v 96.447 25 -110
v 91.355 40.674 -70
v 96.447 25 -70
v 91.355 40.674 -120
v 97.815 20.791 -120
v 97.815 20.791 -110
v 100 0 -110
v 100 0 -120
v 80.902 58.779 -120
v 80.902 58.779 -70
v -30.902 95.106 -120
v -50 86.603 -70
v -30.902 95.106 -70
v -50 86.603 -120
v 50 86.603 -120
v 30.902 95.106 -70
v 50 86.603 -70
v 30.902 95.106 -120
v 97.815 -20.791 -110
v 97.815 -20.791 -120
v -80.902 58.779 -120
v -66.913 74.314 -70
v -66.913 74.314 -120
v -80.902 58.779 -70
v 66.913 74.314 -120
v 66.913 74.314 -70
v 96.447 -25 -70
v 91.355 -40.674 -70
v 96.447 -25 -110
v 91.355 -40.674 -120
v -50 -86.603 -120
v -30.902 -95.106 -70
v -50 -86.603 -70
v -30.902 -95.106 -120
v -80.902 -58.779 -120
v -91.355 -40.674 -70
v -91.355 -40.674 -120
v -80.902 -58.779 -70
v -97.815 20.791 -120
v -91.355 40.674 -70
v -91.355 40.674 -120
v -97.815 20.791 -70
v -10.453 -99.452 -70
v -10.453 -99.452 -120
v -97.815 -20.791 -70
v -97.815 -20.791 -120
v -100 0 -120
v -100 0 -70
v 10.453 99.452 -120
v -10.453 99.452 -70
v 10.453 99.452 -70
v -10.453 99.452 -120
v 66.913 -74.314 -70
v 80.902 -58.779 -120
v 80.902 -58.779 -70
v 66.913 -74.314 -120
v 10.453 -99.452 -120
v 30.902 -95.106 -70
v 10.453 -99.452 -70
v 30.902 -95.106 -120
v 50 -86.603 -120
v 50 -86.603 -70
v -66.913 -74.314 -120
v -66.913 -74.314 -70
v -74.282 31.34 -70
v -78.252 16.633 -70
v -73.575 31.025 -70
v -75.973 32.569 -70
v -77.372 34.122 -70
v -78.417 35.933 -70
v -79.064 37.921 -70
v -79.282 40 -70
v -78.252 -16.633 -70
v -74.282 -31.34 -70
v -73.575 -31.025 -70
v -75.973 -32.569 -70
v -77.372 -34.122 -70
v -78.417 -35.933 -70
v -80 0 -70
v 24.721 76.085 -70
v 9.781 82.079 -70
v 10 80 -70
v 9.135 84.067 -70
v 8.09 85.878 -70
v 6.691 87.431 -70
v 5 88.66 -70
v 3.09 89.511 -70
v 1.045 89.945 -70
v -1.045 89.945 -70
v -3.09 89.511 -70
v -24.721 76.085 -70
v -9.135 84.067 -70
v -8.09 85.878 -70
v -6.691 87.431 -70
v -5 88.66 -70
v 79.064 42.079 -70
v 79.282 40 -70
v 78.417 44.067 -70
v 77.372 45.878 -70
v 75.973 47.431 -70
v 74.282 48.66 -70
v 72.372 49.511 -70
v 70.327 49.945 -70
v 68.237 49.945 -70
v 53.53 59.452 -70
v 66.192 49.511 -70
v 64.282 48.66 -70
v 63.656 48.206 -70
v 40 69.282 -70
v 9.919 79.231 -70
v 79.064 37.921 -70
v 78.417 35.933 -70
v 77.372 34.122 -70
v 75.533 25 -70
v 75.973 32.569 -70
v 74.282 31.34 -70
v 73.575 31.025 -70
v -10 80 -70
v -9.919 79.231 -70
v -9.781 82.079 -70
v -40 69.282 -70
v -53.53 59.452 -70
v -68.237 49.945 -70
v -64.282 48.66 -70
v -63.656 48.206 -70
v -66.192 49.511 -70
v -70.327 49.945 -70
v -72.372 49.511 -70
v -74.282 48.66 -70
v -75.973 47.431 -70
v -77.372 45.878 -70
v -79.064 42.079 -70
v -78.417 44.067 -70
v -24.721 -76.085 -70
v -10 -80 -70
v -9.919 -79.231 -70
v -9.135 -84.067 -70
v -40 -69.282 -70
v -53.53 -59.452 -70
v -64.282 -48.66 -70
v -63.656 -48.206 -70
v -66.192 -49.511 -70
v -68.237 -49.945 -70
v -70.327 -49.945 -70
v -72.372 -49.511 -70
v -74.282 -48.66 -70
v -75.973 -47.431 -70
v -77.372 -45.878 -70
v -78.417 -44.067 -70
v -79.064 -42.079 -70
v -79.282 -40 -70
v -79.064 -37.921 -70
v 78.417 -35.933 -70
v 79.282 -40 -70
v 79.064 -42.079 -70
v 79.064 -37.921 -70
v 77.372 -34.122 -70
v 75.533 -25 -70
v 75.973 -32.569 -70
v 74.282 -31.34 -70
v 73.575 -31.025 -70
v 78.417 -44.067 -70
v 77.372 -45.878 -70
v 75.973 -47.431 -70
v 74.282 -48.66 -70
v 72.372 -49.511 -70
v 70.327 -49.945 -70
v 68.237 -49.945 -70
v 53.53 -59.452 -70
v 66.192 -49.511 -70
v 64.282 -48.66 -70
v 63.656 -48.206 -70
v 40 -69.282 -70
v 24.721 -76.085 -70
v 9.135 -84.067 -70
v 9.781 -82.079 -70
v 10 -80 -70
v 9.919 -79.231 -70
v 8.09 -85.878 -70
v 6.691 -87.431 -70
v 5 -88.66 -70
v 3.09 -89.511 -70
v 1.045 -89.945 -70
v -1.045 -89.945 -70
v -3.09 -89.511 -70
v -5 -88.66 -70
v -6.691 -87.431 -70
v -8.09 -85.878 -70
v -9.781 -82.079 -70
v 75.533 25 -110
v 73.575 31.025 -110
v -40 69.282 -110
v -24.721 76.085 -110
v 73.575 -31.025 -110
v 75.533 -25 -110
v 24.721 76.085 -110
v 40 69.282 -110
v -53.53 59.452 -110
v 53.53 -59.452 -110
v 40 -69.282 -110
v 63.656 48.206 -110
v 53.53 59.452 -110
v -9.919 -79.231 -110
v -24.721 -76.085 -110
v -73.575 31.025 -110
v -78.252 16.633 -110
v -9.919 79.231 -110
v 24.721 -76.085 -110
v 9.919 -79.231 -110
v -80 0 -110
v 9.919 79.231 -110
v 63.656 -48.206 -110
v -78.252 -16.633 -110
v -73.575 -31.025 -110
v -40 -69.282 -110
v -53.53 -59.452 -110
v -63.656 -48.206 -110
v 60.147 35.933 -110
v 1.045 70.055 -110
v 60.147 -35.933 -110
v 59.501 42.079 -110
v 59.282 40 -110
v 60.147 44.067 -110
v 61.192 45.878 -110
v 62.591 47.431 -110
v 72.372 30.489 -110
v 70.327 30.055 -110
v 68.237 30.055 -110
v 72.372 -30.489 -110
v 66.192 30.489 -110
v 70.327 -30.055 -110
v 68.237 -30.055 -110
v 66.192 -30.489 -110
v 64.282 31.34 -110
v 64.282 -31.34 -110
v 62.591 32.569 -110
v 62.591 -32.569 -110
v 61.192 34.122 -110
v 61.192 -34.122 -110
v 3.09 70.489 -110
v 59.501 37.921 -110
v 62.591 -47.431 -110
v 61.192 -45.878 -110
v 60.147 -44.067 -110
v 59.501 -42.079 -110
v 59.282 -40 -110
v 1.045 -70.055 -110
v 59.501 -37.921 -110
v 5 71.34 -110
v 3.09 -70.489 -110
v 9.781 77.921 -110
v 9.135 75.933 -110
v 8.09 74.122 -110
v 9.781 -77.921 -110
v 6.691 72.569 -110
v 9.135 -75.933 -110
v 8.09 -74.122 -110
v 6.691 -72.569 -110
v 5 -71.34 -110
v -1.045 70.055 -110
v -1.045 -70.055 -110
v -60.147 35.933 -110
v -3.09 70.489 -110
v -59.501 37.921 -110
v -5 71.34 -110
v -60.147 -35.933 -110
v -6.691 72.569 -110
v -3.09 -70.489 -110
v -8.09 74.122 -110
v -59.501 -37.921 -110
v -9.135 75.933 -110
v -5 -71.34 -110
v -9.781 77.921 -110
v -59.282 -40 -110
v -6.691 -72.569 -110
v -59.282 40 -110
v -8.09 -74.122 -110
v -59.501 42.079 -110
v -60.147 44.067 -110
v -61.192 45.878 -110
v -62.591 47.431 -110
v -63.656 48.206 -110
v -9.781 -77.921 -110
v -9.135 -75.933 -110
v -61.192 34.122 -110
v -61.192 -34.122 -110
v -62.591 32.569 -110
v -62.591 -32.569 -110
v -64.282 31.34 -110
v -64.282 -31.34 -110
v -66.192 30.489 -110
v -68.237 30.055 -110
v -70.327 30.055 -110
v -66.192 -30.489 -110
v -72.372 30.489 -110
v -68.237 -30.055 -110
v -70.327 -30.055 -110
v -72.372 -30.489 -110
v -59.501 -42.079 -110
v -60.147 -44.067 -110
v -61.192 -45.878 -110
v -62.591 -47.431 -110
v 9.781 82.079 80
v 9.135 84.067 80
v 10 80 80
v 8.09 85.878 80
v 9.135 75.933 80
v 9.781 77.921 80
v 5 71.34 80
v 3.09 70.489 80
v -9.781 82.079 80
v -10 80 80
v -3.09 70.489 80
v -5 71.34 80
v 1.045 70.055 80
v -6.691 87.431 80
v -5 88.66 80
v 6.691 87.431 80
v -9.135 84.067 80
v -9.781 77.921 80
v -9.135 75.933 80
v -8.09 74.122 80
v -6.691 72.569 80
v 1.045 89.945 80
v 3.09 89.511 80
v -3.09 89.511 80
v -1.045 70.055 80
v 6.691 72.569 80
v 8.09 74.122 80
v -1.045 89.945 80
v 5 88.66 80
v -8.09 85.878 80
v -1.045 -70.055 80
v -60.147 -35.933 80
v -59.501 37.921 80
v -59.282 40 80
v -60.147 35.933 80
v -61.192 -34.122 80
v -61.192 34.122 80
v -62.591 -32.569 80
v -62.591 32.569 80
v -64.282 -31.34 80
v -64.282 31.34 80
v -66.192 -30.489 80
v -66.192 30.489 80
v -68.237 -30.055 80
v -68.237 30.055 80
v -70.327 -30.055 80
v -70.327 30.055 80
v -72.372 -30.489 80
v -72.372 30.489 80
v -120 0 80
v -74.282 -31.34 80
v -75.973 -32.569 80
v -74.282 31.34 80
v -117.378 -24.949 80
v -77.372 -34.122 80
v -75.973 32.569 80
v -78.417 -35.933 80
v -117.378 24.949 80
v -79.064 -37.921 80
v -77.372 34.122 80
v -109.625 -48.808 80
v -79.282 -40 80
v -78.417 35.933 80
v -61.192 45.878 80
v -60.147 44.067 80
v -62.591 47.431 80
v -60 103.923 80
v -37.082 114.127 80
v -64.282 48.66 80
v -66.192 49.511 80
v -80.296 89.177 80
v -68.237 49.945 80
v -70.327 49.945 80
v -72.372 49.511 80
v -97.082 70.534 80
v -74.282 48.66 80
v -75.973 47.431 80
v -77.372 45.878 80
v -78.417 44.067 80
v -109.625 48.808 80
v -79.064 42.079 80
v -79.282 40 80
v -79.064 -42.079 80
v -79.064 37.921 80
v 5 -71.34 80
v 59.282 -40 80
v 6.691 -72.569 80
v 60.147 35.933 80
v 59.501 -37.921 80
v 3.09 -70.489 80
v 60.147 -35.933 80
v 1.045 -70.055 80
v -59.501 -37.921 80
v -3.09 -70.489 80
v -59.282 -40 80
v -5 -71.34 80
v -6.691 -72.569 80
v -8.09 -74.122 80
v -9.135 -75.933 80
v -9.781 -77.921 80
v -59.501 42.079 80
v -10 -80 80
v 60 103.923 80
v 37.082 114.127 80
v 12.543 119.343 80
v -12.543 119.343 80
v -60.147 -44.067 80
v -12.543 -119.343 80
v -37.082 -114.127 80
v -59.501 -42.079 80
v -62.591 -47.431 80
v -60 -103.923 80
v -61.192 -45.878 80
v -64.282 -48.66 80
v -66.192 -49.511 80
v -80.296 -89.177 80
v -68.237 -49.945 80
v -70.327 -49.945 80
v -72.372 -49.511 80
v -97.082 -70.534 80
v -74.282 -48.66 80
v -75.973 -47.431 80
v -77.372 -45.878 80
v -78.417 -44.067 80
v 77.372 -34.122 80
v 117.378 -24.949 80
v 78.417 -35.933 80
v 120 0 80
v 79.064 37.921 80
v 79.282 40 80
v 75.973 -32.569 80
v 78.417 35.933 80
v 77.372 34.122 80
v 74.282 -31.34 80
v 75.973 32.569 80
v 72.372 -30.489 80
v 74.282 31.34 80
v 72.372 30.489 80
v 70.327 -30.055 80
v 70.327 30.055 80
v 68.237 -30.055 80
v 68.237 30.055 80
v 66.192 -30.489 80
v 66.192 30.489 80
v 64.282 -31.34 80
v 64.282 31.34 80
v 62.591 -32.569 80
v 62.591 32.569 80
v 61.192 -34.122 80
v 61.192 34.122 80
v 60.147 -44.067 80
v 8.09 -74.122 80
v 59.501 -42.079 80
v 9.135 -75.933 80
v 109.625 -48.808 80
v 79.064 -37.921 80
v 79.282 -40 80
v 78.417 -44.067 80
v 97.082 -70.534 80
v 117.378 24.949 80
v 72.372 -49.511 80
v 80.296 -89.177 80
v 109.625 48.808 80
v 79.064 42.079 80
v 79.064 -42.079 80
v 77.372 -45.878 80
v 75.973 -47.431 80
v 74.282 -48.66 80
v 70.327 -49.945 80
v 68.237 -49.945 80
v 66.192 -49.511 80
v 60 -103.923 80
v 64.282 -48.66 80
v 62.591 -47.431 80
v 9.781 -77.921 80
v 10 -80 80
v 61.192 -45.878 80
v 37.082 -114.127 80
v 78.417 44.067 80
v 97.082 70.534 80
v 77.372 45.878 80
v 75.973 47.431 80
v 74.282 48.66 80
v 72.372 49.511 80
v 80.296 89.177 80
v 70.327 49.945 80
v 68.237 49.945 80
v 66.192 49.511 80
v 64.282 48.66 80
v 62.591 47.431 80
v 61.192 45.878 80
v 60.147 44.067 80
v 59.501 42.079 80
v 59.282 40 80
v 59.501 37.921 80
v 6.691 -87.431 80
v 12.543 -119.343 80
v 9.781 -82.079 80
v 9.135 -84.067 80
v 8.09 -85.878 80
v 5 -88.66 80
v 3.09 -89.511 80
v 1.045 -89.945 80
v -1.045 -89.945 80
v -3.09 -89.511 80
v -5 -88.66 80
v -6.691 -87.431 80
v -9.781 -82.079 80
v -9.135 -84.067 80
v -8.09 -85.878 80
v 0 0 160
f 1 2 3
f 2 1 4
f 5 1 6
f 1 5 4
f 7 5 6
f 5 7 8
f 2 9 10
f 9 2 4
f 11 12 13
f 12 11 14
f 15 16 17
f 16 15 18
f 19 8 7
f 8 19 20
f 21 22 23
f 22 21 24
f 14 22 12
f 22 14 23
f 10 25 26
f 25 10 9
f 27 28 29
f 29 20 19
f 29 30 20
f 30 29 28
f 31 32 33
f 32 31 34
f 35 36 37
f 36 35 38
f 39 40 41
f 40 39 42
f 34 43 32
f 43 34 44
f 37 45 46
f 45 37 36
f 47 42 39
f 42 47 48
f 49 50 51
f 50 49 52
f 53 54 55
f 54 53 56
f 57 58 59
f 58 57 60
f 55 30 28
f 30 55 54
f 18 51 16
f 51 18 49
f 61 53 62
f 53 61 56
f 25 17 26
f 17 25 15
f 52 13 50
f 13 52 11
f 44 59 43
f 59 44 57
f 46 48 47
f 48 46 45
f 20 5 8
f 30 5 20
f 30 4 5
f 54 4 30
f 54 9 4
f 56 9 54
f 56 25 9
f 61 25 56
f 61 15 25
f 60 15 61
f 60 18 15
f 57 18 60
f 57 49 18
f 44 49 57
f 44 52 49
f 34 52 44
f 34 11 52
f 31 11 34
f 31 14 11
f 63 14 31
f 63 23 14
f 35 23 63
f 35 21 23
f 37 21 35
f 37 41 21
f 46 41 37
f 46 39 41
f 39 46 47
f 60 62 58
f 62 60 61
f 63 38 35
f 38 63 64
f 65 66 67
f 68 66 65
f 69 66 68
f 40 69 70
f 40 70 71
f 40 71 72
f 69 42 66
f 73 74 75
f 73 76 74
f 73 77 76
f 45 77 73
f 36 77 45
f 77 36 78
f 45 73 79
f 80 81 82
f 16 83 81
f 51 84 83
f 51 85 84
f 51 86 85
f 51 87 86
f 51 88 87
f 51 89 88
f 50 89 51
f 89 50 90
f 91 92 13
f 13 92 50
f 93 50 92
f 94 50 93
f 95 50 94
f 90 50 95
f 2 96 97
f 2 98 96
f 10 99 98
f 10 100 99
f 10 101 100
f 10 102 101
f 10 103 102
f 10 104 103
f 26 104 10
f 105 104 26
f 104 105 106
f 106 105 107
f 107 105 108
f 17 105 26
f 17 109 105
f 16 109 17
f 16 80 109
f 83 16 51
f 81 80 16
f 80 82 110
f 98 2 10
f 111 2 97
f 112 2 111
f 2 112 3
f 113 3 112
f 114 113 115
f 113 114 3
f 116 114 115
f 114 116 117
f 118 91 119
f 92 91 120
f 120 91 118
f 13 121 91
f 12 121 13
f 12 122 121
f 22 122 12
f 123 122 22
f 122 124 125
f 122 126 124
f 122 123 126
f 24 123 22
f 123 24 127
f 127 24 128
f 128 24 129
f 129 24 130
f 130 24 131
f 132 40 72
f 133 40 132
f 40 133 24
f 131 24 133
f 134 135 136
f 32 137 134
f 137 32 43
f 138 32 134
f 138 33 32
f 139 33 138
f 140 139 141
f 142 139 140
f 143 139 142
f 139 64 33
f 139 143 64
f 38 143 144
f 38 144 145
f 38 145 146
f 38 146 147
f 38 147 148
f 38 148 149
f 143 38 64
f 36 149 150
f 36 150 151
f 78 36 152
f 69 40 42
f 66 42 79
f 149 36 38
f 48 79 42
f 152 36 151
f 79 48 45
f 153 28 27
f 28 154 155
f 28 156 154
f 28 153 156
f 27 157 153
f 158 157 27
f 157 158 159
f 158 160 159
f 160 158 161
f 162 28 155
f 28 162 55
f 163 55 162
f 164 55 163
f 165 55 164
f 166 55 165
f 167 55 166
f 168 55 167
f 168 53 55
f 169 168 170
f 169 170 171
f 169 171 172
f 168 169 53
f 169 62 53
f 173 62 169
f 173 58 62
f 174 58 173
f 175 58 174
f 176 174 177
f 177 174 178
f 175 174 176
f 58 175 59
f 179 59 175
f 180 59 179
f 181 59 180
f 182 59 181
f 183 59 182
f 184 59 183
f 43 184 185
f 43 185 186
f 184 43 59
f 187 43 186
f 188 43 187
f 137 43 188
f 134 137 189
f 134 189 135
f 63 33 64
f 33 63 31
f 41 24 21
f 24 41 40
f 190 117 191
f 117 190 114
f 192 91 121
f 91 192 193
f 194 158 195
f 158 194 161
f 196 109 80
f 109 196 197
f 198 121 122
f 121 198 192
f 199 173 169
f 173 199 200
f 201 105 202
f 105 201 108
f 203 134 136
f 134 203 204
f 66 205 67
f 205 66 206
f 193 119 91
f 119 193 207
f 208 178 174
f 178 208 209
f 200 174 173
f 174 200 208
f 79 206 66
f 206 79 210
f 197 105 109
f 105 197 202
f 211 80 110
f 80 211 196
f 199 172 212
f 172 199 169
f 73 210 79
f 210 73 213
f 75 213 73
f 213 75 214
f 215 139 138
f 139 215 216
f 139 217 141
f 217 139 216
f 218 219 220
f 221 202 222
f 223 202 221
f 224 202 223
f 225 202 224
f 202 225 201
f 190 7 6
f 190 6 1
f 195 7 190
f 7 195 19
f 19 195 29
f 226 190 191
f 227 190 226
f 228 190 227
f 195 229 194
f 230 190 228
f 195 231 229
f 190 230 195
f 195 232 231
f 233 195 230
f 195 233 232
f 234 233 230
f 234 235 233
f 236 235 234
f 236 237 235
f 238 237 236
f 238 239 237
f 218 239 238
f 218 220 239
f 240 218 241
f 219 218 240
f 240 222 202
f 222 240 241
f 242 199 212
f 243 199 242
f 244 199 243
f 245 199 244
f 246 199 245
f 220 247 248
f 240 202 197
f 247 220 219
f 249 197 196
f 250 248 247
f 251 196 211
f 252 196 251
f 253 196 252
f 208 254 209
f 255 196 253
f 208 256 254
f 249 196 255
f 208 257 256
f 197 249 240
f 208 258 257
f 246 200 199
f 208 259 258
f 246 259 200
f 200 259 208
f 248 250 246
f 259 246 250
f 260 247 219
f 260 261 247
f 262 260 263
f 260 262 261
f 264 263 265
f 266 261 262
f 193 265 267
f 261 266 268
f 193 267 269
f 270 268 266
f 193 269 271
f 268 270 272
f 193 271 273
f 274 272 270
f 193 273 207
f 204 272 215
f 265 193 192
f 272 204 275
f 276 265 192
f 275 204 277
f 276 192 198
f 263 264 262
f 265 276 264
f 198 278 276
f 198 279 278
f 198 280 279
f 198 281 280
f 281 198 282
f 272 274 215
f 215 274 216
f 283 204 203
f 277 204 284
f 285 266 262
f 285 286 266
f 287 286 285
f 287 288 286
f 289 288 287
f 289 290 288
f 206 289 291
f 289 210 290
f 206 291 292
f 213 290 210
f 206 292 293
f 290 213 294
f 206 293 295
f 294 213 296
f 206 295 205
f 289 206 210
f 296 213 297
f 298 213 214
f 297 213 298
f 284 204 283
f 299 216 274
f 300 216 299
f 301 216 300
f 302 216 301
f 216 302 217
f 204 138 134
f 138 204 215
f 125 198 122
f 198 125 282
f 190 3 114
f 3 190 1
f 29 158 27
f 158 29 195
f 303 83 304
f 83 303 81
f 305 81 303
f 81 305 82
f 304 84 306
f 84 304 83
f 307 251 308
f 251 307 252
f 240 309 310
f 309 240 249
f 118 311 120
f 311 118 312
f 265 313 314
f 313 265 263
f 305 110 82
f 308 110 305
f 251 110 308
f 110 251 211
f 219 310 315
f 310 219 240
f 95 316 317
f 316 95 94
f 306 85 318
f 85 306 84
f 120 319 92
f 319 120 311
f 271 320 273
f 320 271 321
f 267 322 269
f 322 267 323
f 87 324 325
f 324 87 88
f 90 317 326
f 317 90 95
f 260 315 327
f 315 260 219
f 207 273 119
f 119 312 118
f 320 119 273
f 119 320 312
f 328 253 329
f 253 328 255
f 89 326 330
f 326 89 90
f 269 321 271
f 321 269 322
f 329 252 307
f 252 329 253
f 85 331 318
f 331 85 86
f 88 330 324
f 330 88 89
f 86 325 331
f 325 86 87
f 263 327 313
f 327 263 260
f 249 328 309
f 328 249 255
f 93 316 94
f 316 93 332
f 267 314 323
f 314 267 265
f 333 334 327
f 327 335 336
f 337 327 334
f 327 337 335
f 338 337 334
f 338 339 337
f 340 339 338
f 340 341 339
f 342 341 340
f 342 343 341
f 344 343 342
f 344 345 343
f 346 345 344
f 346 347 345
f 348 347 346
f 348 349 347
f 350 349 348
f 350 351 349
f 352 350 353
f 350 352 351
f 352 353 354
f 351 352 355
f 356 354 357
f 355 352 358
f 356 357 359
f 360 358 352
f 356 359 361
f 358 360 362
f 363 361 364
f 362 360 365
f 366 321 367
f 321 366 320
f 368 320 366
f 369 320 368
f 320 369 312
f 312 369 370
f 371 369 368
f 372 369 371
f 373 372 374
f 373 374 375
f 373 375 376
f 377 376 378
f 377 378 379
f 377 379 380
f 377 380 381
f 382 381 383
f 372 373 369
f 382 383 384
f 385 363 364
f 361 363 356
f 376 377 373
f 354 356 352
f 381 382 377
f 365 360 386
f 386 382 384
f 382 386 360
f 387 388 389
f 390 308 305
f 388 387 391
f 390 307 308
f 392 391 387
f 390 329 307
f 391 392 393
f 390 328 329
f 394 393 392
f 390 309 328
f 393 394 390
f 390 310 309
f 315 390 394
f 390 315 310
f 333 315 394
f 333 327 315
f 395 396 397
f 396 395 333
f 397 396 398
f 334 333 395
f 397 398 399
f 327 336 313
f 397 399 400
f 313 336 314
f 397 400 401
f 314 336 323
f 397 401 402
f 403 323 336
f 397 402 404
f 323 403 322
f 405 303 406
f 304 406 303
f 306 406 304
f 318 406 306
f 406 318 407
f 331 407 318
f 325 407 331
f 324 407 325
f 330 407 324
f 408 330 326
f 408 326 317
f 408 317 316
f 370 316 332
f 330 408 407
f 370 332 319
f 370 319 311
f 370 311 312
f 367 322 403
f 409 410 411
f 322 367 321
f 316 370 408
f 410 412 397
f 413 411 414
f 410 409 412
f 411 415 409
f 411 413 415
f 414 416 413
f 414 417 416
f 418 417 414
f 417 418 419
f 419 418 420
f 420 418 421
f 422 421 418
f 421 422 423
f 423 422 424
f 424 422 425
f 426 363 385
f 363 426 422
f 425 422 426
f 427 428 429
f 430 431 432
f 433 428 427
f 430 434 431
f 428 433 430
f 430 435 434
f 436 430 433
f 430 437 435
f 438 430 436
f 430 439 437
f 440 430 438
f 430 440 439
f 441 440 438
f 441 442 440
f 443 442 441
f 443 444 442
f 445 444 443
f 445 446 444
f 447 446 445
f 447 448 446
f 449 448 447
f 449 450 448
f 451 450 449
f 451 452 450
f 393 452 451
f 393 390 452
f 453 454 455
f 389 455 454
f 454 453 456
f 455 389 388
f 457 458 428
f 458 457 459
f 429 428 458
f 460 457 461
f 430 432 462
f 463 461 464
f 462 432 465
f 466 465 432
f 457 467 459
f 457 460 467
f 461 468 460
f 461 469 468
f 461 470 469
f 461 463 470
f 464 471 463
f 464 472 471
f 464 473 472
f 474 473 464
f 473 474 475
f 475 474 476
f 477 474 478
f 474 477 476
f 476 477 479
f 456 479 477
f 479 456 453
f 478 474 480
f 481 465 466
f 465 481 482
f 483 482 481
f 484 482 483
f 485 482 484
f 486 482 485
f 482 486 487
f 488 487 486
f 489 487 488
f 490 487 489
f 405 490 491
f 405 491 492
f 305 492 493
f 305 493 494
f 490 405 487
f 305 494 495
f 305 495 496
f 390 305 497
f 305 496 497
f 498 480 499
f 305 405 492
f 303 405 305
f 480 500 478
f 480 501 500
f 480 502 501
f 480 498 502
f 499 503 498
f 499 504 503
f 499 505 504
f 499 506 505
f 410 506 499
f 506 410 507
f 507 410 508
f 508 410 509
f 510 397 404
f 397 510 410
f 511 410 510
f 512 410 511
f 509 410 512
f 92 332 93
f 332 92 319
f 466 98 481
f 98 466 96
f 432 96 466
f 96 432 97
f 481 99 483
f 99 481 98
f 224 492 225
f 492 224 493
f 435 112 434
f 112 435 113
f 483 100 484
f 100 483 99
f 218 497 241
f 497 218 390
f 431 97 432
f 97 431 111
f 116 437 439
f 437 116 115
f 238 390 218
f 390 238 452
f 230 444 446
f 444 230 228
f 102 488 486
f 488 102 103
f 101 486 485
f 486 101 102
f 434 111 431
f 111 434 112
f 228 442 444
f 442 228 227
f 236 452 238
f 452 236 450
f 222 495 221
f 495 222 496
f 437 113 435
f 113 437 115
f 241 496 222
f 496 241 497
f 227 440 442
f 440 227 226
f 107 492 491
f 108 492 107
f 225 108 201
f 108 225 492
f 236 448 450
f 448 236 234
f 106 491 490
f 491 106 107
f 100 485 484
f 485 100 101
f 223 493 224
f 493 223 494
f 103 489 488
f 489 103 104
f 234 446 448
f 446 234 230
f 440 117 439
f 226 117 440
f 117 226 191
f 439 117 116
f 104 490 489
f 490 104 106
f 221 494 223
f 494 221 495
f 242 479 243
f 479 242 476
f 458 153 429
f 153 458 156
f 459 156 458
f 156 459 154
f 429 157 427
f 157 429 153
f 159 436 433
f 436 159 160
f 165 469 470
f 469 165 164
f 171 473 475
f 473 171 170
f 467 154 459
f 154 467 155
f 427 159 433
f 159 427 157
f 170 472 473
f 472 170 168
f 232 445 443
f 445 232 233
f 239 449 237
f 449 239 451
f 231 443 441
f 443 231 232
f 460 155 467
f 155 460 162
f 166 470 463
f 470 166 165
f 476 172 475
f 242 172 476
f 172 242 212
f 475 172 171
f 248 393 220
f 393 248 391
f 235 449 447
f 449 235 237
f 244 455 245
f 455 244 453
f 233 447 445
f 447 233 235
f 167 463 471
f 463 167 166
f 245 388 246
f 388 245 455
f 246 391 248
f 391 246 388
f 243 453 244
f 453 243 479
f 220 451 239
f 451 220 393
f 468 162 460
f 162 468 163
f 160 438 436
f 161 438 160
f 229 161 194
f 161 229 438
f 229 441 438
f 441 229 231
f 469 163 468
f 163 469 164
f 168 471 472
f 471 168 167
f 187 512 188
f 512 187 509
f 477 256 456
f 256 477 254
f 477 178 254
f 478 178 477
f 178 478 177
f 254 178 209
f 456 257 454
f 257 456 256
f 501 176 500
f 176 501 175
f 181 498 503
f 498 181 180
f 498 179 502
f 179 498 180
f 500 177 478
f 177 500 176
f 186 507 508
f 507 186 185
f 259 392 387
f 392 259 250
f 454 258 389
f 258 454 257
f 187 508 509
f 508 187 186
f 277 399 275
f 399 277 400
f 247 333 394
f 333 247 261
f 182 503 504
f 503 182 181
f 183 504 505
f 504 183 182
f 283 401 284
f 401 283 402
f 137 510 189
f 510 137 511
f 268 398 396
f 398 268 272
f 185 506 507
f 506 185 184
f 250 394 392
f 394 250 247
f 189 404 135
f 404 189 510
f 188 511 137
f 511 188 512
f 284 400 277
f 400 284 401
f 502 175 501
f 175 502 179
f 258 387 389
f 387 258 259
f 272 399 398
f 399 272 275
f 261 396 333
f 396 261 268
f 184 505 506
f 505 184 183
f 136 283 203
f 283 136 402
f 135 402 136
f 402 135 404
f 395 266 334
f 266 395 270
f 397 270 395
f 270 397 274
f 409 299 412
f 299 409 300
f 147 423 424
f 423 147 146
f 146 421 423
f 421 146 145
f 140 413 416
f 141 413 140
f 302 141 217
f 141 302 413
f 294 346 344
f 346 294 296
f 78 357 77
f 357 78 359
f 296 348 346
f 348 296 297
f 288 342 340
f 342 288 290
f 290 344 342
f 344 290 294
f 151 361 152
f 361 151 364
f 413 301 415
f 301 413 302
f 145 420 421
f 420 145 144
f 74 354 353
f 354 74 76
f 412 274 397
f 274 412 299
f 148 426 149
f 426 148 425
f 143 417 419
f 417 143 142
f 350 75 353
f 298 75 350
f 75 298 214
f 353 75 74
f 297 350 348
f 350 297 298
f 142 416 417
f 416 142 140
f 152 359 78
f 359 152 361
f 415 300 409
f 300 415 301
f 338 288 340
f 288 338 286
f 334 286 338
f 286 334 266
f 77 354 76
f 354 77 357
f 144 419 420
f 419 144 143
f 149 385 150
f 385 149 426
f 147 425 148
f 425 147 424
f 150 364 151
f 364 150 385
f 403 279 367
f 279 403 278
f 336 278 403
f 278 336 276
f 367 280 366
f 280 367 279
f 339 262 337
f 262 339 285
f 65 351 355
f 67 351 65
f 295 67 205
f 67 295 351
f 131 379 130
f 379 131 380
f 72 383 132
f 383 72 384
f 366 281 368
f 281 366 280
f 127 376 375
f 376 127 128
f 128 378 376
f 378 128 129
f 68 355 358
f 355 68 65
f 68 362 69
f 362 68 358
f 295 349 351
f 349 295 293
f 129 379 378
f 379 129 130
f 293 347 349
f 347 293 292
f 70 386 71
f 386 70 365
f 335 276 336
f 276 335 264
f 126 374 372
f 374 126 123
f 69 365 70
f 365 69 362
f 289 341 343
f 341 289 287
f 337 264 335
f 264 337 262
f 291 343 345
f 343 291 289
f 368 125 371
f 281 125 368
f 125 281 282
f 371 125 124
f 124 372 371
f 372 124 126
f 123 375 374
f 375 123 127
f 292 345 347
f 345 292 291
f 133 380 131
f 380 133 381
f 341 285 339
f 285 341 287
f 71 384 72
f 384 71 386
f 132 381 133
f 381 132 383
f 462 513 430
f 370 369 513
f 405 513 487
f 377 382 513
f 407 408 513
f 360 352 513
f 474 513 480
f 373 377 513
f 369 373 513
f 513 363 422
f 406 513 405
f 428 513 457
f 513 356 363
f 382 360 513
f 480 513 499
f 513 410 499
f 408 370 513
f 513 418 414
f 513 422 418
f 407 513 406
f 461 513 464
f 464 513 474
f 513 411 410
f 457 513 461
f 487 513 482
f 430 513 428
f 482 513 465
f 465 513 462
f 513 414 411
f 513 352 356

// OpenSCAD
module gardenhouse()
{
	translate([0, 0, -120]) {
		difference() {
			cylinder(h = 50, r = 100);
			translate([0, 0, 10]) cylinder(h = 50, r = 80);
			translate([100, 0, 35]) cube(50, center = true);
		}
		for (i = [0:5]) {
			echo(360*i/6, sin(360*i/6)*80, cos(360*i/6)*80);
			translate([sin(360*i/6)*80, cos(360*i/6)*80, 0 ])
				cylinder(h = 200, r=10);
		}
		translate([0, 0, 200])
			cylinder(h = 80, r1 = 120, r2 = 0);
	}
}

gardenhouse();
